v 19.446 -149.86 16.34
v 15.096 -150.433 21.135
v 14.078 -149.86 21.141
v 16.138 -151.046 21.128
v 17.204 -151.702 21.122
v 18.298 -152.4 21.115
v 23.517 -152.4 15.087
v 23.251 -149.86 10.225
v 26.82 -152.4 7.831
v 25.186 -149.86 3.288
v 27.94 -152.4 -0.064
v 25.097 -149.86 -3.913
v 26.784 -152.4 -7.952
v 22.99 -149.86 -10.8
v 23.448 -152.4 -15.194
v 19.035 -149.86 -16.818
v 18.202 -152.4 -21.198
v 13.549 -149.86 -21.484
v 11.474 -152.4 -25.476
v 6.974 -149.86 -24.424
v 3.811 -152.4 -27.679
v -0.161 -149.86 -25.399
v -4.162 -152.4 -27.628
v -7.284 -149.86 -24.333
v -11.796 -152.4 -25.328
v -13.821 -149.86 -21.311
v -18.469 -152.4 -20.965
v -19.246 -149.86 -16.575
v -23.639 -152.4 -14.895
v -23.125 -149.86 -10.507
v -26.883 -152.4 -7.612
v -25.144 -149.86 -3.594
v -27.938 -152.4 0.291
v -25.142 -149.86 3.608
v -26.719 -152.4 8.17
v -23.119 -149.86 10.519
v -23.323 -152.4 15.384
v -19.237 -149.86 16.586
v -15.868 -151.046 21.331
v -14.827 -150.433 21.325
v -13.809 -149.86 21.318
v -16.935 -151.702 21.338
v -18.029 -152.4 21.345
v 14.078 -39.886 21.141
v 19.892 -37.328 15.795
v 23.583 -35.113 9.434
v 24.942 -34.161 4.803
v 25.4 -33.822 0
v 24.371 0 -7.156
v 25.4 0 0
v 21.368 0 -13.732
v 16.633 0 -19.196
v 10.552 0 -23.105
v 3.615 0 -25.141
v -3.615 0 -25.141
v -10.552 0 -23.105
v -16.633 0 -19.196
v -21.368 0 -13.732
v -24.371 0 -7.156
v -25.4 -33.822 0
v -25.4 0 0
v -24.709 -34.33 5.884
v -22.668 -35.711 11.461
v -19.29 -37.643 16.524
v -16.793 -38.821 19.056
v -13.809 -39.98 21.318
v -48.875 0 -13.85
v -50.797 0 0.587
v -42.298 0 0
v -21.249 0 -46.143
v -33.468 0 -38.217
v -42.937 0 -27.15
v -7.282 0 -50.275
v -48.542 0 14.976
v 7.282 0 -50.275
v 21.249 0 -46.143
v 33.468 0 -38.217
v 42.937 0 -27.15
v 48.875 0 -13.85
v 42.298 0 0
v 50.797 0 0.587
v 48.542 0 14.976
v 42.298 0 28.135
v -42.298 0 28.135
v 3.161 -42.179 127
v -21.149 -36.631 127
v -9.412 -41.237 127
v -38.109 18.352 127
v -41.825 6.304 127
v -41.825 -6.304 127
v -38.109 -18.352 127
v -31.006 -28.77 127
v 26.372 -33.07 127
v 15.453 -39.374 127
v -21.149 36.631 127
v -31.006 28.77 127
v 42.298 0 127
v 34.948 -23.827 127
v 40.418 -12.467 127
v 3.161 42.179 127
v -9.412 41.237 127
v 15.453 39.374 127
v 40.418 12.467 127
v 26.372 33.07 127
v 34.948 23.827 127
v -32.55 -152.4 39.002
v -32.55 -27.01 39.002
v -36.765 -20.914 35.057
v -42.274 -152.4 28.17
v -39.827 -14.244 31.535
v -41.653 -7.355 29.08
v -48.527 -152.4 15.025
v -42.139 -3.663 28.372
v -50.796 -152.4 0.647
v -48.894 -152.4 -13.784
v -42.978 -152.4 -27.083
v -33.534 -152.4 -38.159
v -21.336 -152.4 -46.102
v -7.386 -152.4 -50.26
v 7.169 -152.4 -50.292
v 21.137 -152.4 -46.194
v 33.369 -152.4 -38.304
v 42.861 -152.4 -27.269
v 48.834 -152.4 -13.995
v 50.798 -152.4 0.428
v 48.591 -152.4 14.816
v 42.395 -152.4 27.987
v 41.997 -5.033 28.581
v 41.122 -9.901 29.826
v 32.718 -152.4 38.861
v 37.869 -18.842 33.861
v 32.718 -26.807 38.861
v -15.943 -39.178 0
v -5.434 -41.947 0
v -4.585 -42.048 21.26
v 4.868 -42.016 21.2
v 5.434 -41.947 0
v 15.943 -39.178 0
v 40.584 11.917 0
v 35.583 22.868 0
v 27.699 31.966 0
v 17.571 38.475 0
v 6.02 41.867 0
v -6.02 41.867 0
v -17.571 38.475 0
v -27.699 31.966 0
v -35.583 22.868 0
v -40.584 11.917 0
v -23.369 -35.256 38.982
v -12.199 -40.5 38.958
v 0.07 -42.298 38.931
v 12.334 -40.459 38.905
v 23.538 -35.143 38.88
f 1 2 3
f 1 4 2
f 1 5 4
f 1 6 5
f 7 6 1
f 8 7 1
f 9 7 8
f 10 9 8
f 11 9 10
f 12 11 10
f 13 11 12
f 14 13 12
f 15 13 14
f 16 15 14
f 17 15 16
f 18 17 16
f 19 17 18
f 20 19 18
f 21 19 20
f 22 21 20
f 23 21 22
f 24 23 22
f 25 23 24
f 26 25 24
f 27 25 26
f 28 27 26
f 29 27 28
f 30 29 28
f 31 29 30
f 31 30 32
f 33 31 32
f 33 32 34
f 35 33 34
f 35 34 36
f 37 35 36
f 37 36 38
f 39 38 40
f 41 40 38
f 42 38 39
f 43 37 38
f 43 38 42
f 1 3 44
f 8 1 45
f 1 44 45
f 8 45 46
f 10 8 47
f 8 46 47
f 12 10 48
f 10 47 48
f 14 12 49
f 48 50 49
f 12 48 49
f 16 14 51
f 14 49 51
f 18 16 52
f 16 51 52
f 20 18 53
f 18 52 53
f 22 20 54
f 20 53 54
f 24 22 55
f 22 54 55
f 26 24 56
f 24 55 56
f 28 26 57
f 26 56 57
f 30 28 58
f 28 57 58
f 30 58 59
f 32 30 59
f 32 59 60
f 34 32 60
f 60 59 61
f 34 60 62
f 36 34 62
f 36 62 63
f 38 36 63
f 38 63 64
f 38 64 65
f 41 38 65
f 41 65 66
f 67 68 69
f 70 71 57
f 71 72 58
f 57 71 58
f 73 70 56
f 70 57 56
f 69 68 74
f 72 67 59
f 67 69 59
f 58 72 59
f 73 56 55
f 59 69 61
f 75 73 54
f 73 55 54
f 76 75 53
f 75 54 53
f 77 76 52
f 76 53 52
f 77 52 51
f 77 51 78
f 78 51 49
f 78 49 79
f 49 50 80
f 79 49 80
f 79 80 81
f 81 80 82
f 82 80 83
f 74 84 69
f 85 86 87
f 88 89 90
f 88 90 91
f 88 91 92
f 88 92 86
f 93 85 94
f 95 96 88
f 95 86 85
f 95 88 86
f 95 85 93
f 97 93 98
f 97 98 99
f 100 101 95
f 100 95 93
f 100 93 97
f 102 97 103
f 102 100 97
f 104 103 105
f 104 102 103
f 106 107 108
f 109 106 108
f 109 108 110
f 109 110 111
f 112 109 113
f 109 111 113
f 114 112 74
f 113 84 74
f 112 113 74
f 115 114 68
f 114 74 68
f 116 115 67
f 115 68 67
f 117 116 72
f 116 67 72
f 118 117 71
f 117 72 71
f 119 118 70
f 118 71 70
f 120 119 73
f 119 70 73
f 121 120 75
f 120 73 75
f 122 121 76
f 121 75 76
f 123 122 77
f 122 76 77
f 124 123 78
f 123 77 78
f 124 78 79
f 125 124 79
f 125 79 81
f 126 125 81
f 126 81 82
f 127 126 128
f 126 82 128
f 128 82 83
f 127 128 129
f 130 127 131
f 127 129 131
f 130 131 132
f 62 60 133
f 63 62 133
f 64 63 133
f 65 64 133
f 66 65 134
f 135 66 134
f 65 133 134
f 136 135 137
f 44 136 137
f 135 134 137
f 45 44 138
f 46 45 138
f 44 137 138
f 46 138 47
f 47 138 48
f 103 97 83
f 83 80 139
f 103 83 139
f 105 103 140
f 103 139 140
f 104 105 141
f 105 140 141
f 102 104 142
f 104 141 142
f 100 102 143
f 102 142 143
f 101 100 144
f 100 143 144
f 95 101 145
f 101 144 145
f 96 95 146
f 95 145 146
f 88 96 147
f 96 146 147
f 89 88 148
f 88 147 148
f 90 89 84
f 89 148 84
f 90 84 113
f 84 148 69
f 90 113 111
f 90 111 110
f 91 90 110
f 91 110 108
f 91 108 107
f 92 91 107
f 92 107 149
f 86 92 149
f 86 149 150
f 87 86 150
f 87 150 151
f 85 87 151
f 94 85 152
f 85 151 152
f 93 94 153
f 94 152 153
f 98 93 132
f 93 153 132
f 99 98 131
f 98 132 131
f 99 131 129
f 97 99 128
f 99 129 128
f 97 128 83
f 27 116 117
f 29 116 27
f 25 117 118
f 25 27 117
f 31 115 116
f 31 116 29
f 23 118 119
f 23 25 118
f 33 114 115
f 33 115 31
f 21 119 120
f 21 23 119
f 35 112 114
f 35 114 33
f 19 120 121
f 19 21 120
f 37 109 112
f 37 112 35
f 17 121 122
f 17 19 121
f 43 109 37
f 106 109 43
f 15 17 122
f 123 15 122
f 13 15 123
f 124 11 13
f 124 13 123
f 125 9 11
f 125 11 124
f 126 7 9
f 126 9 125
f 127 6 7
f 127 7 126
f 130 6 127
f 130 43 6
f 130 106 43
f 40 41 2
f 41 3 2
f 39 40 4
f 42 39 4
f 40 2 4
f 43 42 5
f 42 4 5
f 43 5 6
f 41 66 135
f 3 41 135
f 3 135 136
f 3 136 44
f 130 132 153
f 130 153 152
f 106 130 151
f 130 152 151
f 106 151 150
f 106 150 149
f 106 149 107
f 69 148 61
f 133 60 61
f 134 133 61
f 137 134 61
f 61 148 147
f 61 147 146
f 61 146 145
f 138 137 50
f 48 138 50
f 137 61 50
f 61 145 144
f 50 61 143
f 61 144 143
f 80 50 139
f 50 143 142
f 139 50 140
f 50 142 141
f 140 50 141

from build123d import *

# Parameters (mm, degrees)
F2_DEPTH = 25.4
F3_DEPTH = 127
F4_SIZE  = 2.54
F0_R     = 42.2975618679
F5_DEPTH = 127


with BuildPart() as f2:
    # F1 (on Front) → F2 (new body)
    with BuildSketch(Plane.XZ):
        with BuildLine():
            ThreePointArc((-32.5502825036, 39.0015270077), (-0.1096585285, -50.7998816436), (32.7183586862, 38.8606356726))
            Line((32.7183586862, 38.8606356726), (-32.5502825036, 39.0015270077))
        make_face()
        with BuildLine():
            Line((-13.8090135631, 21.3183288373), (14.0783311513, 21.141442524))
            ThreePointArc((14.0783311513, 21.141442524), (-0.1611061228, -25.3994890661), (-13.8090135631, 21.3183288373))
        make_face(mode=Mode.SUBTRACT)
    extrude(amount=F2_DEPTH)

    # F3 (add): a face of the model
    f3_faces = [f2.faces().sort_by_distance(p)[0] for p in [
        (-0.1067314616, -25.4, -49.443902714),
    ]]
    extrude(f3_faces, amount=F3_DEPTH)

    # F4
    f4_edges = [f2.edges().sort_by_distance(p)[0] for p in [
        (-0.161106, -152.4, -25.399489),
    ]]
    chamfer(f4_edges, length=F4_SIZE)

    # F0 (on Top) → F5 (join)
    with BuildSketch(Plane.XY):
        Circle(F0_R)
    extrude(amount=F5_DEPTH)


solid = f2.part
